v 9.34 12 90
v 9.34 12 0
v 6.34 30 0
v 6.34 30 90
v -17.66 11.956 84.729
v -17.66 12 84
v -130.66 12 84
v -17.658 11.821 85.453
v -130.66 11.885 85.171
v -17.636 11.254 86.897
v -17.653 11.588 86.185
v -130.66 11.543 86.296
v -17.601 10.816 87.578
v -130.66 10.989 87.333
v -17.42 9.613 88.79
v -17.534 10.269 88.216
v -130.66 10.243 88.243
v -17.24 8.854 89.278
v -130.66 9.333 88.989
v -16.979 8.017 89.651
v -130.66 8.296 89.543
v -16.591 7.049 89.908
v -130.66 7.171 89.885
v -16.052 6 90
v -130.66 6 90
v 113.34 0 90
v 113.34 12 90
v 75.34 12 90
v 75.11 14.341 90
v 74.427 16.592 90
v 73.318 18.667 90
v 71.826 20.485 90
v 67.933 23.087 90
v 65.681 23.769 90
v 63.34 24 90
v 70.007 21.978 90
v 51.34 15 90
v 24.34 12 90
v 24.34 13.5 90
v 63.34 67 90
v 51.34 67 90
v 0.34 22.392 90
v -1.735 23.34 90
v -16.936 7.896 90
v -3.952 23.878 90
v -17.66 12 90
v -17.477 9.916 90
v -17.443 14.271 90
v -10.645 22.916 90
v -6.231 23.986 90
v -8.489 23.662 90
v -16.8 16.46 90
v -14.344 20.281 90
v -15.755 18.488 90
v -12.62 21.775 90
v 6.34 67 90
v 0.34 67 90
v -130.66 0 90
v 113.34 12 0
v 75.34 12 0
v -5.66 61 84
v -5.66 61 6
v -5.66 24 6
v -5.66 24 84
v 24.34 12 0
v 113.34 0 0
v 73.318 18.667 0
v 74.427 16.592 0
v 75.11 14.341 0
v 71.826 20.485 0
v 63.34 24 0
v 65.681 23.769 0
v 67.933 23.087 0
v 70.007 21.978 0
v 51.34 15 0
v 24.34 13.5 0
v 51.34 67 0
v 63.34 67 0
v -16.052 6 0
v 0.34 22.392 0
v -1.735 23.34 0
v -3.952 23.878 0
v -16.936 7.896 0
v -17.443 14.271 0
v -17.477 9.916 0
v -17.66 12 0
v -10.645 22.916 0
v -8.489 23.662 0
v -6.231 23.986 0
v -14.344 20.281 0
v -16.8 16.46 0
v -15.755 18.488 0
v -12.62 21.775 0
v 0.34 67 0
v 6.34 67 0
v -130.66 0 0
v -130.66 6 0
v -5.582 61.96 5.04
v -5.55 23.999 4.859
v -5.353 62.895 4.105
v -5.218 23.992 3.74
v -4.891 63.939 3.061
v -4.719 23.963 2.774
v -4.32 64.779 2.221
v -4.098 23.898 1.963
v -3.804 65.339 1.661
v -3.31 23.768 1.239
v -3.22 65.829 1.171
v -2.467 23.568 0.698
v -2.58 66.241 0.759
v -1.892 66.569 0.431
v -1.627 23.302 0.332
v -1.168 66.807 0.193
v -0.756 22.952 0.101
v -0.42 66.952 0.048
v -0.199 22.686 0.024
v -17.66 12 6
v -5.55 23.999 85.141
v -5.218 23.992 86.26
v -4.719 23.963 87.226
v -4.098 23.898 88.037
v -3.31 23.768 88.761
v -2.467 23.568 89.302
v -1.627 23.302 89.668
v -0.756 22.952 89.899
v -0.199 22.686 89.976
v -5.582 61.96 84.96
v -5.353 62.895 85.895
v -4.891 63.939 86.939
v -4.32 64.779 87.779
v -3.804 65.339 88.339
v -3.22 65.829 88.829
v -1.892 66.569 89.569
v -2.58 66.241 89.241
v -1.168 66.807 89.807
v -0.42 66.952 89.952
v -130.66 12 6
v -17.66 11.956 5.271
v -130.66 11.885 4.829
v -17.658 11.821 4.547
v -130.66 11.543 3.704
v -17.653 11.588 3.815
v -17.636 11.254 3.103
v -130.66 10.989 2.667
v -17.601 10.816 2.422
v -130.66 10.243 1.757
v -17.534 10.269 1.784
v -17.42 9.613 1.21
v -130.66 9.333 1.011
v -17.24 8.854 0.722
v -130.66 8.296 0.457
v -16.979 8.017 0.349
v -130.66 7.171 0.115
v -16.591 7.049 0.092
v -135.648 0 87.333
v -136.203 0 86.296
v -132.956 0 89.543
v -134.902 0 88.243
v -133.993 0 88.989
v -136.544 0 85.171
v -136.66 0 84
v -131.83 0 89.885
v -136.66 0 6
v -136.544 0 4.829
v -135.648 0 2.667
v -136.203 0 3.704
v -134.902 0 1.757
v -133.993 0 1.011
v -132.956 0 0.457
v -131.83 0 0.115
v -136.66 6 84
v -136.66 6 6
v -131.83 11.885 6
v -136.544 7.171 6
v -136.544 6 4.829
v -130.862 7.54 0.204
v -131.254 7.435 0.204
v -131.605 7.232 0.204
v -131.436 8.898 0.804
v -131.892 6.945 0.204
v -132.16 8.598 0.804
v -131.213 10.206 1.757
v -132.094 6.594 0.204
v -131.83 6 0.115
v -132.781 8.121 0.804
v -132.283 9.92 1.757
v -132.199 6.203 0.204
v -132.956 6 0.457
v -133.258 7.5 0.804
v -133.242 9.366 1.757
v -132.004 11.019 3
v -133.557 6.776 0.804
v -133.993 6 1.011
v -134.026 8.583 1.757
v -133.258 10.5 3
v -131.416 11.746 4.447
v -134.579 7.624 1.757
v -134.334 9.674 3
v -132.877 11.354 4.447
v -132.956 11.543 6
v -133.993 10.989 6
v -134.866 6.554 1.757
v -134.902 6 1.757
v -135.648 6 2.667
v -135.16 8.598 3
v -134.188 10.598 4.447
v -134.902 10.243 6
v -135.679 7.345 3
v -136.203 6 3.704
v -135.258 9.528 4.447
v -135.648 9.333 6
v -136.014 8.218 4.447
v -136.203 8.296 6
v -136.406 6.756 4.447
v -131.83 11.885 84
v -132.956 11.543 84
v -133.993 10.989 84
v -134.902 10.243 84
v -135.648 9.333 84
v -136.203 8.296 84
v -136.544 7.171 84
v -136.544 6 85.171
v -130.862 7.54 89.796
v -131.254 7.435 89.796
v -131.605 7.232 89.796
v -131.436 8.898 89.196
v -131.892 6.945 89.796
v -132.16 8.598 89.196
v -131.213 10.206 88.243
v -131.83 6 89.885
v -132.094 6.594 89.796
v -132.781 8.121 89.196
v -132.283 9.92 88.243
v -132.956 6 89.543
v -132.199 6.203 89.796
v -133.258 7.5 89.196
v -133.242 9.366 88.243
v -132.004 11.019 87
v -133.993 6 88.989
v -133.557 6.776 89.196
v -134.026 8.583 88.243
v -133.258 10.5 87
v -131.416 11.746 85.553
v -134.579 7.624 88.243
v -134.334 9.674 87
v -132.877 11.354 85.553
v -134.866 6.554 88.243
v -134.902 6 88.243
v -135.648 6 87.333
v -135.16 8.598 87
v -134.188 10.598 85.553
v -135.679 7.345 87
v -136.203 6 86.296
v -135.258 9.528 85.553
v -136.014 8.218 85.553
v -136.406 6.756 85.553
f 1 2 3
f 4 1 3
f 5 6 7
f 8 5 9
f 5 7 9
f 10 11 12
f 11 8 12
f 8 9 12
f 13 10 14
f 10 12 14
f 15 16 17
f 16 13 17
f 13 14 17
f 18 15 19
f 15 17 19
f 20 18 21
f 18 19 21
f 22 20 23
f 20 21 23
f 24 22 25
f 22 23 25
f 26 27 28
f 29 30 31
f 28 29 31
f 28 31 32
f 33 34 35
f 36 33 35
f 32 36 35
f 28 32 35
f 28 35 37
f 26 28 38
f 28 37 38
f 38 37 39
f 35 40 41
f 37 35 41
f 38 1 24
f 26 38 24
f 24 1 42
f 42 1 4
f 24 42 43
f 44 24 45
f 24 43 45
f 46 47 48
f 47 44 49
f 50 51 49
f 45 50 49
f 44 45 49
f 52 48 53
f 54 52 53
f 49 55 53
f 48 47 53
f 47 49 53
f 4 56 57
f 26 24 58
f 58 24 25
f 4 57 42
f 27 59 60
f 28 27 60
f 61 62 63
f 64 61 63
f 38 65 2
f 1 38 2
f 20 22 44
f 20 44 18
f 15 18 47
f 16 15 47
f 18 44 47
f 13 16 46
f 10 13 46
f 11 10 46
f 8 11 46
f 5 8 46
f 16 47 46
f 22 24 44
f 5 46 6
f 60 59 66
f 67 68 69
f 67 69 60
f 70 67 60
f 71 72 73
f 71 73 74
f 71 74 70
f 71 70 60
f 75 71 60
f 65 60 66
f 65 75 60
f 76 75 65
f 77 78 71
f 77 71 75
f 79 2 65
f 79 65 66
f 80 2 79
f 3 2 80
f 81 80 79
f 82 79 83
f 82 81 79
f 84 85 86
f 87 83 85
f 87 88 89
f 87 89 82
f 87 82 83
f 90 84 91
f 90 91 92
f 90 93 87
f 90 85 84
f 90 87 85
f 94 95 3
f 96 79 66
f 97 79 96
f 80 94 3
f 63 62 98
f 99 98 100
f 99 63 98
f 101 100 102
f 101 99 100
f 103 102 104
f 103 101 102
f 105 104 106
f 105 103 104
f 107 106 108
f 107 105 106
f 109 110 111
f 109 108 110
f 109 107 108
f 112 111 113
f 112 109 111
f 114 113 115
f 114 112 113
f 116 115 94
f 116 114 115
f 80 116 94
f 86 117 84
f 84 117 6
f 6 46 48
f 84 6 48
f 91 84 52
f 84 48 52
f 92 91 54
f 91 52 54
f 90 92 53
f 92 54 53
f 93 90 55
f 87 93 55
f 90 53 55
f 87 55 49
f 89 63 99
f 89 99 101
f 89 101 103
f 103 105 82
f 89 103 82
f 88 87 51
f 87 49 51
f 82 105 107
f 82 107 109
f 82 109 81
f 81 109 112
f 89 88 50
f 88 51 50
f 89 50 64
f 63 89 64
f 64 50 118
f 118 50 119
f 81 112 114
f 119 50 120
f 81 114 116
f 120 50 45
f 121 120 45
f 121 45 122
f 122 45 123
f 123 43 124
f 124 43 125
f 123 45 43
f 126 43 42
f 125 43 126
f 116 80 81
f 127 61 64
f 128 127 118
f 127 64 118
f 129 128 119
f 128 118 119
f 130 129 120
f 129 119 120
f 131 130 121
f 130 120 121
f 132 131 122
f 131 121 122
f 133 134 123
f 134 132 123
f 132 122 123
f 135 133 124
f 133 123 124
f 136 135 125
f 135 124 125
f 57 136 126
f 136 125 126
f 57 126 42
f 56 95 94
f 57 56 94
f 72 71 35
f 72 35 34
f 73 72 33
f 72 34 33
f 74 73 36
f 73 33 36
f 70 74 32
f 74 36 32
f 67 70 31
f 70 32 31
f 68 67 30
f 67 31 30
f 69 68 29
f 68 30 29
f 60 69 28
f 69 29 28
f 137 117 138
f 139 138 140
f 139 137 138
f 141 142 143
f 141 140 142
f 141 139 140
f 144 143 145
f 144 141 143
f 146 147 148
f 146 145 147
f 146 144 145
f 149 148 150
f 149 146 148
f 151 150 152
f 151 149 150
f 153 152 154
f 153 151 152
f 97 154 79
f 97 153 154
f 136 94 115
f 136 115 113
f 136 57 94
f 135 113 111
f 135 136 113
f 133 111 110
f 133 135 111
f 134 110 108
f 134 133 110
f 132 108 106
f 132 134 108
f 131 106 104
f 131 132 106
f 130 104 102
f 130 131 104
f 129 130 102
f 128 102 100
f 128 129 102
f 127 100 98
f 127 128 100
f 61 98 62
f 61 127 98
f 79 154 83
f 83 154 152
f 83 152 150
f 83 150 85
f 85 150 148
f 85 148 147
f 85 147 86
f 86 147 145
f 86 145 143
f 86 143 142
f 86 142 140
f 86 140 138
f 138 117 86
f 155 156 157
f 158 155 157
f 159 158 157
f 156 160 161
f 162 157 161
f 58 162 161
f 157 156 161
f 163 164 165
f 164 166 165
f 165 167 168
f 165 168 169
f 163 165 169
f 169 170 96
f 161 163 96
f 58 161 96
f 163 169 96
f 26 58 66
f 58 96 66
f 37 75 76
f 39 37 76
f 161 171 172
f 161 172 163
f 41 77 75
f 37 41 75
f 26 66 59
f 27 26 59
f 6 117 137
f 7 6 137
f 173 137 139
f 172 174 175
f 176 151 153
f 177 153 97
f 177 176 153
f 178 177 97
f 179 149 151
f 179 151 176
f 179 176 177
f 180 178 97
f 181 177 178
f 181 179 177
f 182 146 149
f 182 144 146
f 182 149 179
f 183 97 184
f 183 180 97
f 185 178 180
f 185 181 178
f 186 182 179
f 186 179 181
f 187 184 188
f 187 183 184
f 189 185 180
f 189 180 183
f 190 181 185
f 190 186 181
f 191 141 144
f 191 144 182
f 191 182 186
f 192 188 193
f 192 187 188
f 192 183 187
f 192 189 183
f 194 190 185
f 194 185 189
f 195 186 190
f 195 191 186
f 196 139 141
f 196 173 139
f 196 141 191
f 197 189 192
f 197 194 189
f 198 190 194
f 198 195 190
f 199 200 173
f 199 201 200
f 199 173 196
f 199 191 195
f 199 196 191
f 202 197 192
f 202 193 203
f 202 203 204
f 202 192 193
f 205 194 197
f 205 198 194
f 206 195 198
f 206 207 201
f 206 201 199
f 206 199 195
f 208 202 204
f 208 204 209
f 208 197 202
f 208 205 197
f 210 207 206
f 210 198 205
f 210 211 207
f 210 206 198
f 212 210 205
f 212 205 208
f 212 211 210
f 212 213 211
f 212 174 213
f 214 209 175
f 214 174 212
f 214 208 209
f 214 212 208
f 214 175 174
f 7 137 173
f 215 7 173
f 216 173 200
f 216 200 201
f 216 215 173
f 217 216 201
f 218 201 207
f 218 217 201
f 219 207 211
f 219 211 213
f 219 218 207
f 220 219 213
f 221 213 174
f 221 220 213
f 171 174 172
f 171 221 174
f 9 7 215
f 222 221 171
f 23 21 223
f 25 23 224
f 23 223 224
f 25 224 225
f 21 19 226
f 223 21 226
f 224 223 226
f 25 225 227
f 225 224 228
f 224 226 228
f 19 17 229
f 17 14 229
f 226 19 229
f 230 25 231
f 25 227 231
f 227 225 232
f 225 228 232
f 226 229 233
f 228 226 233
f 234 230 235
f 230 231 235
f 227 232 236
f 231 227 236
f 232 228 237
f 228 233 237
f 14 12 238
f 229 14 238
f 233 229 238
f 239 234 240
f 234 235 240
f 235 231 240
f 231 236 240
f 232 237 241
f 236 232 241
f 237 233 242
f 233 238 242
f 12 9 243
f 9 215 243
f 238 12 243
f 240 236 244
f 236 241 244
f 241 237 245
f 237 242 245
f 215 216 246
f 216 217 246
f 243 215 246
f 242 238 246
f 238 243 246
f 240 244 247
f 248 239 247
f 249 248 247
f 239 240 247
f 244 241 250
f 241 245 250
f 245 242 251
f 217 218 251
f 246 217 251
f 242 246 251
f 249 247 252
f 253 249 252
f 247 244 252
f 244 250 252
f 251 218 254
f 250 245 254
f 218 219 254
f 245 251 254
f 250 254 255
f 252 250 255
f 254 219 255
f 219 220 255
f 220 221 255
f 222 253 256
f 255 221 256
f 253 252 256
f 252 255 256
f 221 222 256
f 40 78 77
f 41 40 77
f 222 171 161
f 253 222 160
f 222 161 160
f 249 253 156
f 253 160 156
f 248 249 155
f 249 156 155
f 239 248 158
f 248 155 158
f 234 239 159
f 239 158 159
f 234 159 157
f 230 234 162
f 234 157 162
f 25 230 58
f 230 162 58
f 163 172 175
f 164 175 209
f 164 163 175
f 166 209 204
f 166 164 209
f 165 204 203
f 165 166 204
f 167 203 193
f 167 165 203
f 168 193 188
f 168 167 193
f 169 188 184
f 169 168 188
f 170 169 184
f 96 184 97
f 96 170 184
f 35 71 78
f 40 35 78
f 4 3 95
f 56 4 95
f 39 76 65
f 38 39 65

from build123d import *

# Parameters (mm, degrees)
PAD_DEPTH         = 90
FILLET_R          = 6
CYLINDER_R        = 12
CYLINDER_DEPTH    = 90
CYLINDER001_R     = 12
CYLINDER001_DEPTH = 90


with BuildPart() as part:
    # Sketch → Pad (new body)
    with BuildSketch(Plane.XY):
        Polygon((-136.659612, 0), (113.340388, 0), (113.340388, 12), (63.340388, 12), (63.340388, 66.999997), (51.340388, 66.999997), (51.340388, 15), (24.340388, 13.5), (24.340388, 12), (9.340388, 12), (6.340388, 30), (6.340388, 67), (-5.659612, 67), (-5.659612, 12), (-136.659612, 12), align=None)
    extrude(amount=PAD_DEPTH)

    # Fillet
    fillet_edges = [part.edges().sort_by_distance(p)[0] for p in [
        (-136.659612, 12, 45),
        (-71.159612, 12, 90),
        (-71.159612, 12, 0),
        (-5.659612, 67, 45),
        (-5.659612, 39.5, 0),
        (-5.659612, 39.5, 90),
        (-136.659612, 6, 0),
        (-136.659612, 6, 90),
    ]]
    fillet(fillet_edges, radius=FILLET_R)

    # Cylinder → Cylinder (join)
    with BuildSketch(Plane(origin=(-5.659612, 12, 90), x_dir=(-1, 0, 0), z_dir=(0, 0, -1))):
        Circle(CYLINDER_R)
    extrude(amount=CYLINDER_DEPTH)

    # Cylinder001 → Cylinder001 (join)
    with BuildSketch(Plane(origin=(63.340388, 12, 90), x_dir=(-1, 0, 0), z_dir=(0, 0, -1))):
        Circle(CYLINDER001_R)
    extrude(amount=CYLINDER001_DEPTH)


solid = part.part
